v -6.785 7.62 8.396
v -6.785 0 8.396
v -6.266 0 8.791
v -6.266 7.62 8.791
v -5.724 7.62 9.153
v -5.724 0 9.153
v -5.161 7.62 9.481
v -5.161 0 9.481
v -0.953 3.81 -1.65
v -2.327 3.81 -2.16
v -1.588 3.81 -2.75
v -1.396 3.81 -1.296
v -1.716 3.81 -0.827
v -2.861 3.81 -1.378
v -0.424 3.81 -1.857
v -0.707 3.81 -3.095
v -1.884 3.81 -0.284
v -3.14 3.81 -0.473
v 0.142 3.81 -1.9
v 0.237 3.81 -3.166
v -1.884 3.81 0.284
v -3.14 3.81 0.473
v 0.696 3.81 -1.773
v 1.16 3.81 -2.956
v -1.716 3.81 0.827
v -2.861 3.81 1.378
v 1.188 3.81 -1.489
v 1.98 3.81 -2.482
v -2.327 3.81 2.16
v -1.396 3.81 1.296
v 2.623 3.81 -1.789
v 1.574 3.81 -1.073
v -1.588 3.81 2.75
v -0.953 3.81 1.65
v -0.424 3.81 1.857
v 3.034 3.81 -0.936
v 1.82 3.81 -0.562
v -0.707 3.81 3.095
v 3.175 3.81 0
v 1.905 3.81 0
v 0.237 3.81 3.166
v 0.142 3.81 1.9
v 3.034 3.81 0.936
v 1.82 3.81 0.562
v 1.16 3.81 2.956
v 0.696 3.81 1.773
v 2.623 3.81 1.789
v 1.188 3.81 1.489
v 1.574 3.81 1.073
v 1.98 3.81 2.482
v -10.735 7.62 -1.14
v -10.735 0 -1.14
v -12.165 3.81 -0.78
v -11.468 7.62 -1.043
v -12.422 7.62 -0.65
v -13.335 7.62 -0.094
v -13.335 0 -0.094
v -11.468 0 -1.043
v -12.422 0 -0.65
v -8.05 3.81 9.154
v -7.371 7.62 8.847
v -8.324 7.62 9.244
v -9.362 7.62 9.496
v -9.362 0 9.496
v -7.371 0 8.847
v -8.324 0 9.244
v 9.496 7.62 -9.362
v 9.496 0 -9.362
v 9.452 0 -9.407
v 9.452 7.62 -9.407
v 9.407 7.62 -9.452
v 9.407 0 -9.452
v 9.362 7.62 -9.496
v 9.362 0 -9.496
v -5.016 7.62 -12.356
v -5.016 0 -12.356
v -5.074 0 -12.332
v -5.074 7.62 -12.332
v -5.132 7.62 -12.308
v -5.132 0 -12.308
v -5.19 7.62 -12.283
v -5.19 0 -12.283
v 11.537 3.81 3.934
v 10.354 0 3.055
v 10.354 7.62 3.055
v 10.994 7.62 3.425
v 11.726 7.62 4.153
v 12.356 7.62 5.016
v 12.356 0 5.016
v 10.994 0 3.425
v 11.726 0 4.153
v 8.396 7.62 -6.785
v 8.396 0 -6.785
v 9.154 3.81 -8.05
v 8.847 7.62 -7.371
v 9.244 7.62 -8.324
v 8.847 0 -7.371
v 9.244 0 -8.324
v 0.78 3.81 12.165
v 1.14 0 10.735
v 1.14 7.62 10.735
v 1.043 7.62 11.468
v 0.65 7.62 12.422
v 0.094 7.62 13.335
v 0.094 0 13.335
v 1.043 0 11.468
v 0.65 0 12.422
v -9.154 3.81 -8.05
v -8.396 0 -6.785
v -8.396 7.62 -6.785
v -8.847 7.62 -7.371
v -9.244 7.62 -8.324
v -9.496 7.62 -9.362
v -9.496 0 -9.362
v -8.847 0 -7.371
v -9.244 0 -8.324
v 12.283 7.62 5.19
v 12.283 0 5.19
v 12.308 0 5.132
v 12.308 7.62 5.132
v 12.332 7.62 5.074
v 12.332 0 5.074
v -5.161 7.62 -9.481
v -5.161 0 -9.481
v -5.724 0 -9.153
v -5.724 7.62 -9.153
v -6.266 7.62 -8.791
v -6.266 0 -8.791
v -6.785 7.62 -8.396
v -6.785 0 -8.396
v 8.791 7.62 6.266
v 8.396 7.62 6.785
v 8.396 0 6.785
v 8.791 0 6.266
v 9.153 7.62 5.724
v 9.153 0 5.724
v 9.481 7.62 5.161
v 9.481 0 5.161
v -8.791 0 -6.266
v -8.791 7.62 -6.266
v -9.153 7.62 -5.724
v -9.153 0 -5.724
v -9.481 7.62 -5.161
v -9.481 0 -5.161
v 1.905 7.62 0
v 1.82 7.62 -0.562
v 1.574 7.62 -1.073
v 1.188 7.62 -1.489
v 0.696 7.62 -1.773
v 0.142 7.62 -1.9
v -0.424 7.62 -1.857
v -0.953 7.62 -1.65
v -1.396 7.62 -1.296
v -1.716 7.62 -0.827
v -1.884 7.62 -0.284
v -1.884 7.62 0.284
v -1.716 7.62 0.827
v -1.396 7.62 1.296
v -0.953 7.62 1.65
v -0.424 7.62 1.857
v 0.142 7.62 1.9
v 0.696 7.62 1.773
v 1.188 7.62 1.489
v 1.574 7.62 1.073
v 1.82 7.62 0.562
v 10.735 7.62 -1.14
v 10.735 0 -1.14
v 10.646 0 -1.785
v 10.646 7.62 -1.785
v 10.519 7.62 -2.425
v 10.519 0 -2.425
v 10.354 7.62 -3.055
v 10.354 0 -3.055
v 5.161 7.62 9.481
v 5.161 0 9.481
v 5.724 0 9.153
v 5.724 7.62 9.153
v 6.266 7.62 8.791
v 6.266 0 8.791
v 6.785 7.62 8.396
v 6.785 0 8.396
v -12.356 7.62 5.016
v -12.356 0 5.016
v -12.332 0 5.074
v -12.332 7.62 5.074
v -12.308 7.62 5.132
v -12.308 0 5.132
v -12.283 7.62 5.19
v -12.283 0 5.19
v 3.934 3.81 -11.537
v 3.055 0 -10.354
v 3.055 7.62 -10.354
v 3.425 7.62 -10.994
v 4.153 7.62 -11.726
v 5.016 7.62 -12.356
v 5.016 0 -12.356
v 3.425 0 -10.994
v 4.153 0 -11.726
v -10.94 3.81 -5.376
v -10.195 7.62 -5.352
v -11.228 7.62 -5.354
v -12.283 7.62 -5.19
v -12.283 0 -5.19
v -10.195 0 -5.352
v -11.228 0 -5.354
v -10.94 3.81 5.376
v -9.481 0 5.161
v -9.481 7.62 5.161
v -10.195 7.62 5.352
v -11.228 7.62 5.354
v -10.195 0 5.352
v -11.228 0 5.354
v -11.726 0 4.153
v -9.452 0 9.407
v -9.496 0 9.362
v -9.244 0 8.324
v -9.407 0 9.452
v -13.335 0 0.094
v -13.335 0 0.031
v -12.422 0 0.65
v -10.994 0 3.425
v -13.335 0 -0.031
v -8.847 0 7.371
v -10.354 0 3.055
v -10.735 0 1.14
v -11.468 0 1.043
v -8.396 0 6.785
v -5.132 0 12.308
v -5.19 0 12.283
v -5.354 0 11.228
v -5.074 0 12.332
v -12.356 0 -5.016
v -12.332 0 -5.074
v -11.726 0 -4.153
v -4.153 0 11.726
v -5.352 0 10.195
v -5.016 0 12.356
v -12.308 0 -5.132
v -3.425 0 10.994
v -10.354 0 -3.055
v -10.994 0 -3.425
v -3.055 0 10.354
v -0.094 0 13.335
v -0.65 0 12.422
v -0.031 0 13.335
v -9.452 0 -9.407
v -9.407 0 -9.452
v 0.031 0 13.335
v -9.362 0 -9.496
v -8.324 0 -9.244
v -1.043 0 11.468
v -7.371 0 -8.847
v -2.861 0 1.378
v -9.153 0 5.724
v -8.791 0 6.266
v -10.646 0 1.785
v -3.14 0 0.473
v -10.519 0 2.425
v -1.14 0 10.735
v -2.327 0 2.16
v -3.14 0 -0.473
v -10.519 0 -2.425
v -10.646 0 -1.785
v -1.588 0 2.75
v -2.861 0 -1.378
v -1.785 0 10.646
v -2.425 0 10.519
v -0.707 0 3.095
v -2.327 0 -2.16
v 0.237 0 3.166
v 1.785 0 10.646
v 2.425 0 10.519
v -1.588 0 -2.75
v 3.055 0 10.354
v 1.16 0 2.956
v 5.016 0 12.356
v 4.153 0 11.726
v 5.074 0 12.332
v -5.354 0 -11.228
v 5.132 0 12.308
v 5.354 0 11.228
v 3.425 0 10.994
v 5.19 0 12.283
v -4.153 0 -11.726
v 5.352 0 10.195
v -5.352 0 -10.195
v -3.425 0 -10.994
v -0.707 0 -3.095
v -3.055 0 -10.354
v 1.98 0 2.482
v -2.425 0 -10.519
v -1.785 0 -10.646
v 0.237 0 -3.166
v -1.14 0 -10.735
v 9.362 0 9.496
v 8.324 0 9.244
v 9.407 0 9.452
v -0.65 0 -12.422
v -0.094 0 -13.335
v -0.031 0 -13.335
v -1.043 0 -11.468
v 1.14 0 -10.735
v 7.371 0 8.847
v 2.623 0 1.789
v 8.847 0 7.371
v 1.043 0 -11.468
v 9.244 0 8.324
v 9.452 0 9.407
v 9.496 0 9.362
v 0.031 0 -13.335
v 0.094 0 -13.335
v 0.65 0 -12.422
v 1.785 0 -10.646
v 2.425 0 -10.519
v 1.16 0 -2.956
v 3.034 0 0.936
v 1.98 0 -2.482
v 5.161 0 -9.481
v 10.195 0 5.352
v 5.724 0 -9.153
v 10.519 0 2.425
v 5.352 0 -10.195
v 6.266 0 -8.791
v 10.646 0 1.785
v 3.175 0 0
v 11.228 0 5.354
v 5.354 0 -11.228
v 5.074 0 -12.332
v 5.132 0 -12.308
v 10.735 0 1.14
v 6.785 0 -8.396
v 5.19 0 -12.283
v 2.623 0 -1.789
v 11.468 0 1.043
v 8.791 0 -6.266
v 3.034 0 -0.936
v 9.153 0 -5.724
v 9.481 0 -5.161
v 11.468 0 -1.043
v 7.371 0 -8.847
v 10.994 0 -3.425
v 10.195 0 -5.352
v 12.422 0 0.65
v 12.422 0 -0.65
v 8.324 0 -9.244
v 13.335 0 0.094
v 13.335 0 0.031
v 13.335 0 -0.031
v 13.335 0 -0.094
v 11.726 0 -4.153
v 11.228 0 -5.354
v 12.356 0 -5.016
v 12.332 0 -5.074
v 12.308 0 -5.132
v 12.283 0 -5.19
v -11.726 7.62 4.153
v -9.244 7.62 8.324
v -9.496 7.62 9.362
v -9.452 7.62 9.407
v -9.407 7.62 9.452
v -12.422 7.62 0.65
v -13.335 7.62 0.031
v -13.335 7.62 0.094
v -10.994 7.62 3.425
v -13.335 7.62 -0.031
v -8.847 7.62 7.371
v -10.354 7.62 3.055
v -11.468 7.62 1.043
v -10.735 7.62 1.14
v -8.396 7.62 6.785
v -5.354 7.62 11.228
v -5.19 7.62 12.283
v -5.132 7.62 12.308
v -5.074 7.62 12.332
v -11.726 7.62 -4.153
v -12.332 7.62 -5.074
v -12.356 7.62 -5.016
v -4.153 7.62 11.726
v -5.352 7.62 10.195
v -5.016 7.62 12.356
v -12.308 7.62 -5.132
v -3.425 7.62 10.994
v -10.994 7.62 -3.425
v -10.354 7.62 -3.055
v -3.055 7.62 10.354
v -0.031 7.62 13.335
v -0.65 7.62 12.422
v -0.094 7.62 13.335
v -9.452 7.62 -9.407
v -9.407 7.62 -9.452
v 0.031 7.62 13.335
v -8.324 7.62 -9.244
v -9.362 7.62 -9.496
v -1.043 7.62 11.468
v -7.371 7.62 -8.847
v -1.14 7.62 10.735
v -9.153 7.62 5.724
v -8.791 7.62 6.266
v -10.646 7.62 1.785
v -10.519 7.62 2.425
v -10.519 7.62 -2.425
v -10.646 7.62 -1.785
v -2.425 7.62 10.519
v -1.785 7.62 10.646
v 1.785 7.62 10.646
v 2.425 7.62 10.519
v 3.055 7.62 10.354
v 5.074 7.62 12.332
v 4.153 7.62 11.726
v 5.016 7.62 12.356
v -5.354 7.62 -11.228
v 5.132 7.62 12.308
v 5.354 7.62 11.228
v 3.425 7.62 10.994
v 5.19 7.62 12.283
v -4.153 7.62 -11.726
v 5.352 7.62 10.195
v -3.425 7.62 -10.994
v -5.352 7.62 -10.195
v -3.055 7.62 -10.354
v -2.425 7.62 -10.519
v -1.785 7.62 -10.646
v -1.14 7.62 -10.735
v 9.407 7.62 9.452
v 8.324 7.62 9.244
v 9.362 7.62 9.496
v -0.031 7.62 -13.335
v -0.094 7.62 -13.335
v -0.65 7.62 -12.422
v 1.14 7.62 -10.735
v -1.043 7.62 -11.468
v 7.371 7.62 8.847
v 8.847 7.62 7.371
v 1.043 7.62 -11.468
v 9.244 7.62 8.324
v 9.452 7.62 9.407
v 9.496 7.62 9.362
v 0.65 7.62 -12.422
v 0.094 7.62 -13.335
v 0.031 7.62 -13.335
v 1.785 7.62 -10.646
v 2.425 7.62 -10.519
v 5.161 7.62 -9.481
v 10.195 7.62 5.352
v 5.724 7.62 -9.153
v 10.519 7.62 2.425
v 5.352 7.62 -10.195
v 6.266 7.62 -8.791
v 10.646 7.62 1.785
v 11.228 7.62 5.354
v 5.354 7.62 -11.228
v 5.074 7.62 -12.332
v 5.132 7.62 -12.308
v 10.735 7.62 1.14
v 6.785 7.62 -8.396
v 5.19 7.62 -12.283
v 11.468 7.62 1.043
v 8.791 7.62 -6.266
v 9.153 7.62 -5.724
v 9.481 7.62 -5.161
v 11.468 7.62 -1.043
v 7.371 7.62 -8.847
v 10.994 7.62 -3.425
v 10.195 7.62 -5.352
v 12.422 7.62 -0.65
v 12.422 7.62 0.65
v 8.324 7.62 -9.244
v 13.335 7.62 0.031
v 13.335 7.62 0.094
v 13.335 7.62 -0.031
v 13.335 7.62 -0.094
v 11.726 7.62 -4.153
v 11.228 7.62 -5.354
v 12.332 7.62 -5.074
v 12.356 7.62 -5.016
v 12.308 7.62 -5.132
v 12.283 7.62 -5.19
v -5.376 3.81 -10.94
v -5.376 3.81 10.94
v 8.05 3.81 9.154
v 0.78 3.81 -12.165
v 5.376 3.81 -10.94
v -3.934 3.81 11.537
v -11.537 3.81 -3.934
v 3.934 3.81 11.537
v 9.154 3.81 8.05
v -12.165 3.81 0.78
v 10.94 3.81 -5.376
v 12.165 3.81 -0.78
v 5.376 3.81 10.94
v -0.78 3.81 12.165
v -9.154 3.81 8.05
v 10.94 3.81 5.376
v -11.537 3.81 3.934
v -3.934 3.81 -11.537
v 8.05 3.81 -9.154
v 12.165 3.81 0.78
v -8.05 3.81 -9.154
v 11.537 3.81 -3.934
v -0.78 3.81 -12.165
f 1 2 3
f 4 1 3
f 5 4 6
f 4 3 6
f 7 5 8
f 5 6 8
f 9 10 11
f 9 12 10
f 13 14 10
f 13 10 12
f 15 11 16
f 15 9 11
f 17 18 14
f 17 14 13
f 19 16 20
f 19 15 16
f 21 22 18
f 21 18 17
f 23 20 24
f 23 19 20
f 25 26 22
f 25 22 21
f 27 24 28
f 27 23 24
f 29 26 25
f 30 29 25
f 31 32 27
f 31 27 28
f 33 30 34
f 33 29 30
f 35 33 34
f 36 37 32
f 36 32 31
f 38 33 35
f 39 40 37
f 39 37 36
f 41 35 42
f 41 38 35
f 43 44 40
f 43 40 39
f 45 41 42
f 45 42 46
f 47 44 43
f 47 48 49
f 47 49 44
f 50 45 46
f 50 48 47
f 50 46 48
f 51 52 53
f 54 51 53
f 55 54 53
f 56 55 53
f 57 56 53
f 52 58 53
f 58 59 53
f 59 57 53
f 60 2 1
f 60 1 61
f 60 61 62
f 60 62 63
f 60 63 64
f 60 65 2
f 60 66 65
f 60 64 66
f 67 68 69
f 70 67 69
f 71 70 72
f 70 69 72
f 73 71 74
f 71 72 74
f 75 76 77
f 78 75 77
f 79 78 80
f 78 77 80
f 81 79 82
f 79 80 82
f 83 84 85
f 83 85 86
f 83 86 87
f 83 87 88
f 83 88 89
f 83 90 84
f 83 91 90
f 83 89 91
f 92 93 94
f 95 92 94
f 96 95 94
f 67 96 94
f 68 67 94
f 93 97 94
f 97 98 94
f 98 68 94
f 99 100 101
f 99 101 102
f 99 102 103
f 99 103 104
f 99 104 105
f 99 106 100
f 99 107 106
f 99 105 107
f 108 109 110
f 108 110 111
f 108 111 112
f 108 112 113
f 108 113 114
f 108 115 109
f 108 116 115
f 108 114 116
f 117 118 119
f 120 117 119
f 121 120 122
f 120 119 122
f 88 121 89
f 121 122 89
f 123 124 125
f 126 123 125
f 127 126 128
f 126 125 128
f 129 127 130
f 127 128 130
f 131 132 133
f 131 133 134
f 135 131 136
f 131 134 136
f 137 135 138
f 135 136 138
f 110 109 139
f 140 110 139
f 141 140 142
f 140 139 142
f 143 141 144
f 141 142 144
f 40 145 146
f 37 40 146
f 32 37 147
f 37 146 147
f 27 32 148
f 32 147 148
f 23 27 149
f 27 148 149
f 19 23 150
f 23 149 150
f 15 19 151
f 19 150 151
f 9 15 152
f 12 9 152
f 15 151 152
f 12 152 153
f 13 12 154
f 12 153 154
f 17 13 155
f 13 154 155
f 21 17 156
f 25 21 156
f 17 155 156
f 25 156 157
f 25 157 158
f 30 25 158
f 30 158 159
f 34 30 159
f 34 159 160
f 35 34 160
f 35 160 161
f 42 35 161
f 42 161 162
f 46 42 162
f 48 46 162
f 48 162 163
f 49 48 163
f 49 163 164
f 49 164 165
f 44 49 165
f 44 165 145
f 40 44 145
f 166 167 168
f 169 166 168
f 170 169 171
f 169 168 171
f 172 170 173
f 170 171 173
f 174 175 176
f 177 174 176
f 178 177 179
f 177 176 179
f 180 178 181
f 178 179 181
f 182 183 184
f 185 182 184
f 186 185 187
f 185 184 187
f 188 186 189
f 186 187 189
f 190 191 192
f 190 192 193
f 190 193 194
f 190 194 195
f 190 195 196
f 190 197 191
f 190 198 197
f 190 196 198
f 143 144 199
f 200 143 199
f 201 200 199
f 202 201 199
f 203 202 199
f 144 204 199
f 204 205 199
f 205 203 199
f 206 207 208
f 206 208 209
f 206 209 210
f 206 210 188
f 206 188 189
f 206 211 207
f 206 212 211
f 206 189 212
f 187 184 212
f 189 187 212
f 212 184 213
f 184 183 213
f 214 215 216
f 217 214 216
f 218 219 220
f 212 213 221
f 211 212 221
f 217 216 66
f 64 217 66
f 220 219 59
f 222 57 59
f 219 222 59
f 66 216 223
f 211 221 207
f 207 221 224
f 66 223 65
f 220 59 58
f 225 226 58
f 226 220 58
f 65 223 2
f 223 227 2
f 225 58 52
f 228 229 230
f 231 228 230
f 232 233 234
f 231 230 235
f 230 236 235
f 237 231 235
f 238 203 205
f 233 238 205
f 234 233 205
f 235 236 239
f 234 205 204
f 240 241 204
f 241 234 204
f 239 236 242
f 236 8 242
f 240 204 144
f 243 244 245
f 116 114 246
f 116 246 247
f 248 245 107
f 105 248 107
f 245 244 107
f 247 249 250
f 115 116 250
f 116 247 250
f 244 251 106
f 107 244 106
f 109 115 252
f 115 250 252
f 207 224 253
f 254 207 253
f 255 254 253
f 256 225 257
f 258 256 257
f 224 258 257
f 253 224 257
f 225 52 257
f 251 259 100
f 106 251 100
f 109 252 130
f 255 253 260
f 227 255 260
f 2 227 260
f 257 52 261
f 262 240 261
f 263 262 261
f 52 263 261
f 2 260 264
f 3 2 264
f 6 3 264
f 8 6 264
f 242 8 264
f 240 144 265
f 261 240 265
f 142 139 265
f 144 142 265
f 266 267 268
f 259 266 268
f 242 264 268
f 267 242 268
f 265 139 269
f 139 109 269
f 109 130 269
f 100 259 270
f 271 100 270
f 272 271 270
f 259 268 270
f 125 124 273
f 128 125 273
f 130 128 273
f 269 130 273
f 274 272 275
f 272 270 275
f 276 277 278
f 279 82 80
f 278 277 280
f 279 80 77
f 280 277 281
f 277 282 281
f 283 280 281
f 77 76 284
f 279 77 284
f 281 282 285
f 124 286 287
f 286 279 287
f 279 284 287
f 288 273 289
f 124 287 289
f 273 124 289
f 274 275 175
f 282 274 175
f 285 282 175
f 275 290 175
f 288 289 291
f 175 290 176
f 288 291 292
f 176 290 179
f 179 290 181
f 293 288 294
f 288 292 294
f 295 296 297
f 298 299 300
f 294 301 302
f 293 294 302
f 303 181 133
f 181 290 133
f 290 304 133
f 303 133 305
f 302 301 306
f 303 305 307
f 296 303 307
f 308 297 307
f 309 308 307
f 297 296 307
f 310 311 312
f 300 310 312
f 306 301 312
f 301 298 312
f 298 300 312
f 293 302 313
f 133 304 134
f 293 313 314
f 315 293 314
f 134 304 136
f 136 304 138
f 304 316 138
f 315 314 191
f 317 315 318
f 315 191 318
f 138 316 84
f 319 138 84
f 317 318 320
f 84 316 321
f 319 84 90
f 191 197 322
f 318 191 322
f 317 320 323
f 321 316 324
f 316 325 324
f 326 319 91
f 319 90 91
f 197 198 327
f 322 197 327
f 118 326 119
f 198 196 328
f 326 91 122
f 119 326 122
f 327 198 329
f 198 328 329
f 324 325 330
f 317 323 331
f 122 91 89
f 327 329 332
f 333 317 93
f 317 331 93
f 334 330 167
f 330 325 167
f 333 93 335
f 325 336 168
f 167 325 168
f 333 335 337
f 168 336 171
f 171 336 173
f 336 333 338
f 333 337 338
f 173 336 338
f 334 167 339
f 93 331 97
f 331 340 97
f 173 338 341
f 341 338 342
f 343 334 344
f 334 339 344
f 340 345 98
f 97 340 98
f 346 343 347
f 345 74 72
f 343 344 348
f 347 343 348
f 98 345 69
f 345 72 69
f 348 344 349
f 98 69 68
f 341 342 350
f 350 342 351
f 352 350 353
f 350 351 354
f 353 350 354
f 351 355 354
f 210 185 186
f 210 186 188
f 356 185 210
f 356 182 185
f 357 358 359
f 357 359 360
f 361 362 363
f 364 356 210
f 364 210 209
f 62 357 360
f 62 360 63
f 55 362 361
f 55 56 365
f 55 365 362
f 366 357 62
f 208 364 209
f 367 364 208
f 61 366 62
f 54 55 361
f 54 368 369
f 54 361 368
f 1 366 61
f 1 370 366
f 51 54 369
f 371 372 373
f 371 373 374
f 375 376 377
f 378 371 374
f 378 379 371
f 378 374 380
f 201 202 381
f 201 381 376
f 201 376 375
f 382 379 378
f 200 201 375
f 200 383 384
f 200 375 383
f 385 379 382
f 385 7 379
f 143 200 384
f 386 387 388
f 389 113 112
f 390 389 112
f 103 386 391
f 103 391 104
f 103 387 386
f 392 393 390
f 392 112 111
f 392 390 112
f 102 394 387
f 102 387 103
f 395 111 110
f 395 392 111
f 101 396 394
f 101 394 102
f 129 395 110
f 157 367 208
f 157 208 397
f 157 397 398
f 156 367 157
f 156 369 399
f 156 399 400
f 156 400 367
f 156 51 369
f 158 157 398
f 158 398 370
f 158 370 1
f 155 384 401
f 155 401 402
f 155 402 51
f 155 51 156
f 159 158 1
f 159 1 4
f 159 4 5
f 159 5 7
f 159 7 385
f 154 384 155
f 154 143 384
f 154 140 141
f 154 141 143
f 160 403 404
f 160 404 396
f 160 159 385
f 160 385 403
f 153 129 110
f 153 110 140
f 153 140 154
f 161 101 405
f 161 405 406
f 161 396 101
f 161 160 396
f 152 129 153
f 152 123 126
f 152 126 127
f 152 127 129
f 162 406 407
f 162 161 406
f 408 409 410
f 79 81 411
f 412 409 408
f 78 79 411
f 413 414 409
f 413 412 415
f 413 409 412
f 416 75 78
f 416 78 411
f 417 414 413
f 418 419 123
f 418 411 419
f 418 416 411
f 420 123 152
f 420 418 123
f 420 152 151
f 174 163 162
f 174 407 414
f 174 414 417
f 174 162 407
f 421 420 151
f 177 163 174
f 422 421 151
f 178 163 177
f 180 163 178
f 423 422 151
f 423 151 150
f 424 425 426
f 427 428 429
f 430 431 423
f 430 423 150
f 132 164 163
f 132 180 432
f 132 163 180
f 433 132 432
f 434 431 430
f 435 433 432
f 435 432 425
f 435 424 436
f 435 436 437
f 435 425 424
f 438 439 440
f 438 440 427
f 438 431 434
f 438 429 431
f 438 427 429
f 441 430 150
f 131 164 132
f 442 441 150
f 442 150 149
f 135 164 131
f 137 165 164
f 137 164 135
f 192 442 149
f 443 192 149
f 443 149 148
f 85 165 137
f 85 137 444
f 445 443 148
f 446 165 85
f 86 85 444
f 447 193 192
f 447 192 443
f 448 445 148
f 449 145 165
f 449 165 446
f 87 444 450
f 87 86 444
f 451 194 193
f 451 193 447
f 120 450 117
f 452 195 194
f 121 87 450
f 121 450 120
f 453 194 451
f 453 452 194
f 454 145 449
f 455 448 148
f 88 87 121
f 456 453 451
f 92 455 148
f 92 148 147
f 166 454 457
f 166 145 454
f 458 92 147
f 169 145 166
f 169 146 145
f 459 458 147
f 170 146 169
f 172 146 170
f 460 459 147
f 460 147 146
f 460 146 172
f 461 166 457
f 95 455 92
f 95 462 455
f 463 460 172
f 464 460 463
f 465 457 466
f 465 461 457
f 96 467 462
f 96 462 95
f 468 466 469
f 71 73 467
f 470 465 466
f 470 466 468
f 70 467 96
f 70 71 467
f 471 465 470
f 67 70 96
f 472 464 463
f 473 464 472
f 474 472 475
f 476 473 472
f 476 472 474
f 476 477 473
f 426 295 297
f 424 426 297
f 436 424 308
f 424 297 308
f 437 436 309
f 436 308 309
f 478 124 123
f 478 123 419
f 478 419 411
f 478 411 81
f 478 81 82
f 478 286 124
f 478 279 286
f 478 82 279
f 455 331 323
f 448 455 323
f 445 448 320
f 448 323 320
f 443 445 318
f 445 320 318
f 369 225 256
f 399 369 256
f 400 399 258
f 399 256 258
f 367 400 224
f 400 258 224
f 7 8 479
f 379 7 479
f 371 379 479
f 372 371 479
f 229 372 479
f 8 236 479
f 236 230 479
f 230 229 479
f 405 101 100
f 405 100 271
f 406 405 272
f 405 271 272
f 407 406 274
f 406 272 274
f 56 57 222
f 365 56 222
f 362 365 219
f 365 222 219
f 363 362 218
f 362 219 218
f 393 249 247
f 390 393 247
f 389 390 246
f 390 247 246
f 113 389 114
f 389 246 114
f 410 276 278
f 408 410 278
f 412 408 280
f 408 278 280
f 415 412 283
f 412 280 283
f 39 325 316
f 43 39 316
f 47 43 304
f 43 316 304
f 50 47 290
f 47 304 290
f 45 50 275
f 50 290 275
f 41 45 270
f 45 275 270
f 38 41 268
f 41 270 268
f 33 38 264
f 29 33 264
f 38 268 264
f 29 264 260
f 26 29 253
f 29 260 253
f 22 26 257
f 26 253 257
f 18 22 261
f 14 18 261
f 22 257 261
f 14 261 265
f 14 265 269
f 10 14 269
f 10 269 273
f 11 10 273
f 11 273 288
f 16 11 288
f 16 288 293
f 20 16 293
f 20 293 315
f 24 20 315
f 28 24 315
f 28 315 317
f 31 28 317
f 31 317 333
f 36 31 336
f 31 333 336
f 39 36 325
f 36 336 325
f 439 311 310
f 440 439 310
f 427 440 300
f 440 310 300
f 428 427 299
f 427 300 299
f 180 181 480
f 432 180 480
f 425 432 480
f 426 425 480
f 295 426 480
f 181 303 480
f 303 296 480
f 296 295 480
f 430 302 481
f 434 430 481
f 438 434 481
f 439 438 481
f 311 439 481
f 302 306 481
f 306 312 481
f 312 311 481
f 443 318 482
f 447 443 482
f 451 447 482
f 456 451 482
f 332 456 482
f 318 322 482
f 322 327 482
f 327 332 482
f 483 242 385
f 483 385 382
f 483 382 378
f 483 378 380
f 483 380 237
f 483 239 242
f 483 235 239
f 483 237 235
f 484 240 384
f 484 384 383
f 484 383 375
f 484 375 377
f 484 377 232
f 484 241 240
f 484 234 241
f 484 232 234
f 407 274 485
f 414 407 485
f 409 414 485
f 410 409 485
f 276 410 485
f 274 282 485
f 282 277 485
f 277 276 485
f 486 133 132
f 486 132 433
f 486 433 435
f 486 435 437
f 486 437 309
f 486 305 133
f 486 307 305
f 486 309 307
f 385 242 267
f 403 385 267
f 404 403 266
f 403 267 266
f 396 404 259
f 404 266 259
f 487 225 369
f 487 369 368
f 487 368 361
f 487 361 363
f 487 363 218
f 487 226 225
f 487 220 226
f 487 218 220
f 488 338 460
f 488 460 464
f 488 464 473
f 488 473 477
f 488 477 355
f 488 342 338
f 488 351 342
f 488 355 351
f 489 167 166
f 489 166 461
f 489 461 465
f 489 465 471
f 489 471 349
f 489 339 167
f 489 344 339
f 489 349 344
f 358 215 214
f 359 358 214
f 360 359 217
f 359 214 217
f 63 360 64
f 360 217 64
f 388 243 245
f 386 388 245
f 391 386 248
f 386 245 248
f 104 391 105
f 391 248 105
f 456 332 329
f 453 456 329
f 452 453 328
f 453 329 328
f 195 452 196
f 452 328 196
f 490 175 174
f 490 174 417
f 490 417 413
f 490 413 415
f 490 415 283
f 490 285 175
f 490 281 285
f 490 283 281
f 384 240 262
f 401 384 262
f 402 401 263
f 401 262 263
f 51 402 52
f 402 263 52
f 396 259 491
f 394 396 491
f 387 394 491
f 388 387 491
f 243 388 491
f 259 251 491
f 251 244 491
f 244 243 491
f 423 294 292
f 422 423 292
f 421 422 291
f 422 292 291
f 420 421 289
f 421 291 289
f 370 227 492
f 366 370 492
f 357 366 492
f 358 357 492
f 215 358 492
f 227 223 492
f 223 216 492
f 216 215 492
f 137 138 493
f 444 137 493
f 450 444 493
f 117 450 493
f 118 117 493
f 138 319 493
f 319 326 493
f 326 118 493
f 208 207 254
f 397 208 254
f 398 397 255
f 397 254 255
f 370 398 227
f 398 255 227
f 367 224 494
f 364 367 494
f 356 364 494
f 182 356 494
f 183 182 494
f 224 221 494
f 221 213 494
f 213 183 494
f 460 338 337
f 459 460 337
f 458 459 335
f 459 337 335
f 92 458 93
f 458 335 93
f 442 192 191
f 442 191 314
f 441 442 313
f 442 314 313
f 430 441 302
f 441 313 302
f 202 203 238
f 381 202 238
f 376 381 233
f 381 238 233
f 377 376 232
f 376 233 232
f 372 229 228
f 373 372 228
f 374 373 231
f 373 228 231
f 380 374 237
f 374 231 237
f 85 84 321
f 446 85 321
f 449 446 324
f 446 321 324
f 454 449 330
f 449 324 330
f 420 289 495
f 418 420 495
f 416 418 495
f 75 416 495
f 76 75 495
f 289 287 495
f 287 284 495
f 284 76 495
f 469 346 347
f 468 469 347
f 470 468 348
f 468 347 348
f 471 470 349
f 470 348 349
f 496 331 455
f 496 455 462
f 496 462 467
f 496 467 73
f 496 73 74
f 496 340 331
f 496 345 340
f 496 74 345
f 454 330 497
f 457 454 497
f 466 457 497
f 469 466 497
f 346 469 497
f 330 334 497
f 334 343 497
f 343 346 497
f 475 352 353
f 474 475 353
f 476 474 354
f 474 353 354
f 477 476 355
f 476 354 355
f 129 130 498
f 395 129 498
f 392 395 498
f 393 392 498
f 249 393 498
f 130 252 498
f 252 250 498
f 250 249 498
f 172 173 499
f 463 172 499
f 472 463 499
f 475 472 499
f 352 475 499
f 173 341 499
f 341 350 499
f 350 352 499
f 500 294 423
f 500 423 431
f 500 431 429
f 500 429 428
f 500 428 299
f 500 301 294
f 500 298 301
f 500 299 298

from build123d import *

# Parameters (mm, degrees)
BOSS_EXTRUDE1_DEPTH = 7.62
CIRPATTERN1_COUNT   = 16
SKETCH2_R           = 1.905
CUT_EXTRUDE1_DEPTH  = 8.6200001
SKETCH4_R           = 3.175
CUT_EXTRUDE2_DEPTH  = 3.81


with BuildPart() as part:
    # Sketch1 → Boss-Extrude1 (new body)
    with BuildSketch(Plane(origin=(0, 0, 0), x_dir=(1, 0, 0), z_dir=(0, 1, 0))):
        with BuildLine():
            add(Edge.make_bspline(
                [(1.139719329, 10.734666499), (1.147399116, 11.22537279), (0.871214241, 12.119041795), (0.344554873, 12.955131401), (0.094484742, 13.334665261)],
                knots=[0.007821969, 0.007821969, 0.007821969, 0.007821969, 0.5, 0.928051836, 0.928051836, 0.928051836, 0.928051836], degree=3))
            ThreePointArc((0.094484742, 13.334665261), (0, 13.335), (-0.094484742, 13.334665261))
            add(Edge.make_bspline(
                [(-1.139719329, 10.734666499), (-1.147399116, 11.22537279), (-0.871214241, 12.119041795), (-0.344554873, 12.955131401), (-0.094484742, 13.334665261)],
                knots=[0.007821969, 0.007821969, 0.007821969, 0.007821969, 0.5, 0.928051836, 0.928051836, 0.928051836, 0.928051836], degree=3))
            ThreePointArc((-1.139719329, 10.734666499), (0, -10.795), (1.139719329, 10.734666499))
        make_face()
    boss_extrude1 = extrude(amount=BOSS_EXTRUDE1_DEPTH)

    # CirPattern1: Boss-Extrude1 ×16 about axis
    cirpattern1_axis = Axis((0, 7.62, 0), (0, 1, 0))
    for i in range(1, CIRPATTERN1_COUNT):
        add(boss_extrude1.rotate(cirpattern1_axis, i * 360 / CIRPATTERN1_COUNT))

    # Sketch2 → Cut-Extrude1 (cut, through all)
    with BuildSketch(Plane(origin=(0, 7.62, 0), x_dir=(1, 0, 0), z_dir=(0, 1, 0))):
        Circle(SKETCH2_R)
    extrude(amount=-CUT_EXTRUDE1_DEPTH, mode=Mode.SUBTRACT)

    # Sketch4 → Cut-Extrude2 (cut)
    with BuildSketch(Plane.XZ):
        Circle(SKETCH4_R)
    extrude(amount=-CUT_EXTRUDE2_DEPTH, mode=Mode.SUBTRACT)


solid = part.part
